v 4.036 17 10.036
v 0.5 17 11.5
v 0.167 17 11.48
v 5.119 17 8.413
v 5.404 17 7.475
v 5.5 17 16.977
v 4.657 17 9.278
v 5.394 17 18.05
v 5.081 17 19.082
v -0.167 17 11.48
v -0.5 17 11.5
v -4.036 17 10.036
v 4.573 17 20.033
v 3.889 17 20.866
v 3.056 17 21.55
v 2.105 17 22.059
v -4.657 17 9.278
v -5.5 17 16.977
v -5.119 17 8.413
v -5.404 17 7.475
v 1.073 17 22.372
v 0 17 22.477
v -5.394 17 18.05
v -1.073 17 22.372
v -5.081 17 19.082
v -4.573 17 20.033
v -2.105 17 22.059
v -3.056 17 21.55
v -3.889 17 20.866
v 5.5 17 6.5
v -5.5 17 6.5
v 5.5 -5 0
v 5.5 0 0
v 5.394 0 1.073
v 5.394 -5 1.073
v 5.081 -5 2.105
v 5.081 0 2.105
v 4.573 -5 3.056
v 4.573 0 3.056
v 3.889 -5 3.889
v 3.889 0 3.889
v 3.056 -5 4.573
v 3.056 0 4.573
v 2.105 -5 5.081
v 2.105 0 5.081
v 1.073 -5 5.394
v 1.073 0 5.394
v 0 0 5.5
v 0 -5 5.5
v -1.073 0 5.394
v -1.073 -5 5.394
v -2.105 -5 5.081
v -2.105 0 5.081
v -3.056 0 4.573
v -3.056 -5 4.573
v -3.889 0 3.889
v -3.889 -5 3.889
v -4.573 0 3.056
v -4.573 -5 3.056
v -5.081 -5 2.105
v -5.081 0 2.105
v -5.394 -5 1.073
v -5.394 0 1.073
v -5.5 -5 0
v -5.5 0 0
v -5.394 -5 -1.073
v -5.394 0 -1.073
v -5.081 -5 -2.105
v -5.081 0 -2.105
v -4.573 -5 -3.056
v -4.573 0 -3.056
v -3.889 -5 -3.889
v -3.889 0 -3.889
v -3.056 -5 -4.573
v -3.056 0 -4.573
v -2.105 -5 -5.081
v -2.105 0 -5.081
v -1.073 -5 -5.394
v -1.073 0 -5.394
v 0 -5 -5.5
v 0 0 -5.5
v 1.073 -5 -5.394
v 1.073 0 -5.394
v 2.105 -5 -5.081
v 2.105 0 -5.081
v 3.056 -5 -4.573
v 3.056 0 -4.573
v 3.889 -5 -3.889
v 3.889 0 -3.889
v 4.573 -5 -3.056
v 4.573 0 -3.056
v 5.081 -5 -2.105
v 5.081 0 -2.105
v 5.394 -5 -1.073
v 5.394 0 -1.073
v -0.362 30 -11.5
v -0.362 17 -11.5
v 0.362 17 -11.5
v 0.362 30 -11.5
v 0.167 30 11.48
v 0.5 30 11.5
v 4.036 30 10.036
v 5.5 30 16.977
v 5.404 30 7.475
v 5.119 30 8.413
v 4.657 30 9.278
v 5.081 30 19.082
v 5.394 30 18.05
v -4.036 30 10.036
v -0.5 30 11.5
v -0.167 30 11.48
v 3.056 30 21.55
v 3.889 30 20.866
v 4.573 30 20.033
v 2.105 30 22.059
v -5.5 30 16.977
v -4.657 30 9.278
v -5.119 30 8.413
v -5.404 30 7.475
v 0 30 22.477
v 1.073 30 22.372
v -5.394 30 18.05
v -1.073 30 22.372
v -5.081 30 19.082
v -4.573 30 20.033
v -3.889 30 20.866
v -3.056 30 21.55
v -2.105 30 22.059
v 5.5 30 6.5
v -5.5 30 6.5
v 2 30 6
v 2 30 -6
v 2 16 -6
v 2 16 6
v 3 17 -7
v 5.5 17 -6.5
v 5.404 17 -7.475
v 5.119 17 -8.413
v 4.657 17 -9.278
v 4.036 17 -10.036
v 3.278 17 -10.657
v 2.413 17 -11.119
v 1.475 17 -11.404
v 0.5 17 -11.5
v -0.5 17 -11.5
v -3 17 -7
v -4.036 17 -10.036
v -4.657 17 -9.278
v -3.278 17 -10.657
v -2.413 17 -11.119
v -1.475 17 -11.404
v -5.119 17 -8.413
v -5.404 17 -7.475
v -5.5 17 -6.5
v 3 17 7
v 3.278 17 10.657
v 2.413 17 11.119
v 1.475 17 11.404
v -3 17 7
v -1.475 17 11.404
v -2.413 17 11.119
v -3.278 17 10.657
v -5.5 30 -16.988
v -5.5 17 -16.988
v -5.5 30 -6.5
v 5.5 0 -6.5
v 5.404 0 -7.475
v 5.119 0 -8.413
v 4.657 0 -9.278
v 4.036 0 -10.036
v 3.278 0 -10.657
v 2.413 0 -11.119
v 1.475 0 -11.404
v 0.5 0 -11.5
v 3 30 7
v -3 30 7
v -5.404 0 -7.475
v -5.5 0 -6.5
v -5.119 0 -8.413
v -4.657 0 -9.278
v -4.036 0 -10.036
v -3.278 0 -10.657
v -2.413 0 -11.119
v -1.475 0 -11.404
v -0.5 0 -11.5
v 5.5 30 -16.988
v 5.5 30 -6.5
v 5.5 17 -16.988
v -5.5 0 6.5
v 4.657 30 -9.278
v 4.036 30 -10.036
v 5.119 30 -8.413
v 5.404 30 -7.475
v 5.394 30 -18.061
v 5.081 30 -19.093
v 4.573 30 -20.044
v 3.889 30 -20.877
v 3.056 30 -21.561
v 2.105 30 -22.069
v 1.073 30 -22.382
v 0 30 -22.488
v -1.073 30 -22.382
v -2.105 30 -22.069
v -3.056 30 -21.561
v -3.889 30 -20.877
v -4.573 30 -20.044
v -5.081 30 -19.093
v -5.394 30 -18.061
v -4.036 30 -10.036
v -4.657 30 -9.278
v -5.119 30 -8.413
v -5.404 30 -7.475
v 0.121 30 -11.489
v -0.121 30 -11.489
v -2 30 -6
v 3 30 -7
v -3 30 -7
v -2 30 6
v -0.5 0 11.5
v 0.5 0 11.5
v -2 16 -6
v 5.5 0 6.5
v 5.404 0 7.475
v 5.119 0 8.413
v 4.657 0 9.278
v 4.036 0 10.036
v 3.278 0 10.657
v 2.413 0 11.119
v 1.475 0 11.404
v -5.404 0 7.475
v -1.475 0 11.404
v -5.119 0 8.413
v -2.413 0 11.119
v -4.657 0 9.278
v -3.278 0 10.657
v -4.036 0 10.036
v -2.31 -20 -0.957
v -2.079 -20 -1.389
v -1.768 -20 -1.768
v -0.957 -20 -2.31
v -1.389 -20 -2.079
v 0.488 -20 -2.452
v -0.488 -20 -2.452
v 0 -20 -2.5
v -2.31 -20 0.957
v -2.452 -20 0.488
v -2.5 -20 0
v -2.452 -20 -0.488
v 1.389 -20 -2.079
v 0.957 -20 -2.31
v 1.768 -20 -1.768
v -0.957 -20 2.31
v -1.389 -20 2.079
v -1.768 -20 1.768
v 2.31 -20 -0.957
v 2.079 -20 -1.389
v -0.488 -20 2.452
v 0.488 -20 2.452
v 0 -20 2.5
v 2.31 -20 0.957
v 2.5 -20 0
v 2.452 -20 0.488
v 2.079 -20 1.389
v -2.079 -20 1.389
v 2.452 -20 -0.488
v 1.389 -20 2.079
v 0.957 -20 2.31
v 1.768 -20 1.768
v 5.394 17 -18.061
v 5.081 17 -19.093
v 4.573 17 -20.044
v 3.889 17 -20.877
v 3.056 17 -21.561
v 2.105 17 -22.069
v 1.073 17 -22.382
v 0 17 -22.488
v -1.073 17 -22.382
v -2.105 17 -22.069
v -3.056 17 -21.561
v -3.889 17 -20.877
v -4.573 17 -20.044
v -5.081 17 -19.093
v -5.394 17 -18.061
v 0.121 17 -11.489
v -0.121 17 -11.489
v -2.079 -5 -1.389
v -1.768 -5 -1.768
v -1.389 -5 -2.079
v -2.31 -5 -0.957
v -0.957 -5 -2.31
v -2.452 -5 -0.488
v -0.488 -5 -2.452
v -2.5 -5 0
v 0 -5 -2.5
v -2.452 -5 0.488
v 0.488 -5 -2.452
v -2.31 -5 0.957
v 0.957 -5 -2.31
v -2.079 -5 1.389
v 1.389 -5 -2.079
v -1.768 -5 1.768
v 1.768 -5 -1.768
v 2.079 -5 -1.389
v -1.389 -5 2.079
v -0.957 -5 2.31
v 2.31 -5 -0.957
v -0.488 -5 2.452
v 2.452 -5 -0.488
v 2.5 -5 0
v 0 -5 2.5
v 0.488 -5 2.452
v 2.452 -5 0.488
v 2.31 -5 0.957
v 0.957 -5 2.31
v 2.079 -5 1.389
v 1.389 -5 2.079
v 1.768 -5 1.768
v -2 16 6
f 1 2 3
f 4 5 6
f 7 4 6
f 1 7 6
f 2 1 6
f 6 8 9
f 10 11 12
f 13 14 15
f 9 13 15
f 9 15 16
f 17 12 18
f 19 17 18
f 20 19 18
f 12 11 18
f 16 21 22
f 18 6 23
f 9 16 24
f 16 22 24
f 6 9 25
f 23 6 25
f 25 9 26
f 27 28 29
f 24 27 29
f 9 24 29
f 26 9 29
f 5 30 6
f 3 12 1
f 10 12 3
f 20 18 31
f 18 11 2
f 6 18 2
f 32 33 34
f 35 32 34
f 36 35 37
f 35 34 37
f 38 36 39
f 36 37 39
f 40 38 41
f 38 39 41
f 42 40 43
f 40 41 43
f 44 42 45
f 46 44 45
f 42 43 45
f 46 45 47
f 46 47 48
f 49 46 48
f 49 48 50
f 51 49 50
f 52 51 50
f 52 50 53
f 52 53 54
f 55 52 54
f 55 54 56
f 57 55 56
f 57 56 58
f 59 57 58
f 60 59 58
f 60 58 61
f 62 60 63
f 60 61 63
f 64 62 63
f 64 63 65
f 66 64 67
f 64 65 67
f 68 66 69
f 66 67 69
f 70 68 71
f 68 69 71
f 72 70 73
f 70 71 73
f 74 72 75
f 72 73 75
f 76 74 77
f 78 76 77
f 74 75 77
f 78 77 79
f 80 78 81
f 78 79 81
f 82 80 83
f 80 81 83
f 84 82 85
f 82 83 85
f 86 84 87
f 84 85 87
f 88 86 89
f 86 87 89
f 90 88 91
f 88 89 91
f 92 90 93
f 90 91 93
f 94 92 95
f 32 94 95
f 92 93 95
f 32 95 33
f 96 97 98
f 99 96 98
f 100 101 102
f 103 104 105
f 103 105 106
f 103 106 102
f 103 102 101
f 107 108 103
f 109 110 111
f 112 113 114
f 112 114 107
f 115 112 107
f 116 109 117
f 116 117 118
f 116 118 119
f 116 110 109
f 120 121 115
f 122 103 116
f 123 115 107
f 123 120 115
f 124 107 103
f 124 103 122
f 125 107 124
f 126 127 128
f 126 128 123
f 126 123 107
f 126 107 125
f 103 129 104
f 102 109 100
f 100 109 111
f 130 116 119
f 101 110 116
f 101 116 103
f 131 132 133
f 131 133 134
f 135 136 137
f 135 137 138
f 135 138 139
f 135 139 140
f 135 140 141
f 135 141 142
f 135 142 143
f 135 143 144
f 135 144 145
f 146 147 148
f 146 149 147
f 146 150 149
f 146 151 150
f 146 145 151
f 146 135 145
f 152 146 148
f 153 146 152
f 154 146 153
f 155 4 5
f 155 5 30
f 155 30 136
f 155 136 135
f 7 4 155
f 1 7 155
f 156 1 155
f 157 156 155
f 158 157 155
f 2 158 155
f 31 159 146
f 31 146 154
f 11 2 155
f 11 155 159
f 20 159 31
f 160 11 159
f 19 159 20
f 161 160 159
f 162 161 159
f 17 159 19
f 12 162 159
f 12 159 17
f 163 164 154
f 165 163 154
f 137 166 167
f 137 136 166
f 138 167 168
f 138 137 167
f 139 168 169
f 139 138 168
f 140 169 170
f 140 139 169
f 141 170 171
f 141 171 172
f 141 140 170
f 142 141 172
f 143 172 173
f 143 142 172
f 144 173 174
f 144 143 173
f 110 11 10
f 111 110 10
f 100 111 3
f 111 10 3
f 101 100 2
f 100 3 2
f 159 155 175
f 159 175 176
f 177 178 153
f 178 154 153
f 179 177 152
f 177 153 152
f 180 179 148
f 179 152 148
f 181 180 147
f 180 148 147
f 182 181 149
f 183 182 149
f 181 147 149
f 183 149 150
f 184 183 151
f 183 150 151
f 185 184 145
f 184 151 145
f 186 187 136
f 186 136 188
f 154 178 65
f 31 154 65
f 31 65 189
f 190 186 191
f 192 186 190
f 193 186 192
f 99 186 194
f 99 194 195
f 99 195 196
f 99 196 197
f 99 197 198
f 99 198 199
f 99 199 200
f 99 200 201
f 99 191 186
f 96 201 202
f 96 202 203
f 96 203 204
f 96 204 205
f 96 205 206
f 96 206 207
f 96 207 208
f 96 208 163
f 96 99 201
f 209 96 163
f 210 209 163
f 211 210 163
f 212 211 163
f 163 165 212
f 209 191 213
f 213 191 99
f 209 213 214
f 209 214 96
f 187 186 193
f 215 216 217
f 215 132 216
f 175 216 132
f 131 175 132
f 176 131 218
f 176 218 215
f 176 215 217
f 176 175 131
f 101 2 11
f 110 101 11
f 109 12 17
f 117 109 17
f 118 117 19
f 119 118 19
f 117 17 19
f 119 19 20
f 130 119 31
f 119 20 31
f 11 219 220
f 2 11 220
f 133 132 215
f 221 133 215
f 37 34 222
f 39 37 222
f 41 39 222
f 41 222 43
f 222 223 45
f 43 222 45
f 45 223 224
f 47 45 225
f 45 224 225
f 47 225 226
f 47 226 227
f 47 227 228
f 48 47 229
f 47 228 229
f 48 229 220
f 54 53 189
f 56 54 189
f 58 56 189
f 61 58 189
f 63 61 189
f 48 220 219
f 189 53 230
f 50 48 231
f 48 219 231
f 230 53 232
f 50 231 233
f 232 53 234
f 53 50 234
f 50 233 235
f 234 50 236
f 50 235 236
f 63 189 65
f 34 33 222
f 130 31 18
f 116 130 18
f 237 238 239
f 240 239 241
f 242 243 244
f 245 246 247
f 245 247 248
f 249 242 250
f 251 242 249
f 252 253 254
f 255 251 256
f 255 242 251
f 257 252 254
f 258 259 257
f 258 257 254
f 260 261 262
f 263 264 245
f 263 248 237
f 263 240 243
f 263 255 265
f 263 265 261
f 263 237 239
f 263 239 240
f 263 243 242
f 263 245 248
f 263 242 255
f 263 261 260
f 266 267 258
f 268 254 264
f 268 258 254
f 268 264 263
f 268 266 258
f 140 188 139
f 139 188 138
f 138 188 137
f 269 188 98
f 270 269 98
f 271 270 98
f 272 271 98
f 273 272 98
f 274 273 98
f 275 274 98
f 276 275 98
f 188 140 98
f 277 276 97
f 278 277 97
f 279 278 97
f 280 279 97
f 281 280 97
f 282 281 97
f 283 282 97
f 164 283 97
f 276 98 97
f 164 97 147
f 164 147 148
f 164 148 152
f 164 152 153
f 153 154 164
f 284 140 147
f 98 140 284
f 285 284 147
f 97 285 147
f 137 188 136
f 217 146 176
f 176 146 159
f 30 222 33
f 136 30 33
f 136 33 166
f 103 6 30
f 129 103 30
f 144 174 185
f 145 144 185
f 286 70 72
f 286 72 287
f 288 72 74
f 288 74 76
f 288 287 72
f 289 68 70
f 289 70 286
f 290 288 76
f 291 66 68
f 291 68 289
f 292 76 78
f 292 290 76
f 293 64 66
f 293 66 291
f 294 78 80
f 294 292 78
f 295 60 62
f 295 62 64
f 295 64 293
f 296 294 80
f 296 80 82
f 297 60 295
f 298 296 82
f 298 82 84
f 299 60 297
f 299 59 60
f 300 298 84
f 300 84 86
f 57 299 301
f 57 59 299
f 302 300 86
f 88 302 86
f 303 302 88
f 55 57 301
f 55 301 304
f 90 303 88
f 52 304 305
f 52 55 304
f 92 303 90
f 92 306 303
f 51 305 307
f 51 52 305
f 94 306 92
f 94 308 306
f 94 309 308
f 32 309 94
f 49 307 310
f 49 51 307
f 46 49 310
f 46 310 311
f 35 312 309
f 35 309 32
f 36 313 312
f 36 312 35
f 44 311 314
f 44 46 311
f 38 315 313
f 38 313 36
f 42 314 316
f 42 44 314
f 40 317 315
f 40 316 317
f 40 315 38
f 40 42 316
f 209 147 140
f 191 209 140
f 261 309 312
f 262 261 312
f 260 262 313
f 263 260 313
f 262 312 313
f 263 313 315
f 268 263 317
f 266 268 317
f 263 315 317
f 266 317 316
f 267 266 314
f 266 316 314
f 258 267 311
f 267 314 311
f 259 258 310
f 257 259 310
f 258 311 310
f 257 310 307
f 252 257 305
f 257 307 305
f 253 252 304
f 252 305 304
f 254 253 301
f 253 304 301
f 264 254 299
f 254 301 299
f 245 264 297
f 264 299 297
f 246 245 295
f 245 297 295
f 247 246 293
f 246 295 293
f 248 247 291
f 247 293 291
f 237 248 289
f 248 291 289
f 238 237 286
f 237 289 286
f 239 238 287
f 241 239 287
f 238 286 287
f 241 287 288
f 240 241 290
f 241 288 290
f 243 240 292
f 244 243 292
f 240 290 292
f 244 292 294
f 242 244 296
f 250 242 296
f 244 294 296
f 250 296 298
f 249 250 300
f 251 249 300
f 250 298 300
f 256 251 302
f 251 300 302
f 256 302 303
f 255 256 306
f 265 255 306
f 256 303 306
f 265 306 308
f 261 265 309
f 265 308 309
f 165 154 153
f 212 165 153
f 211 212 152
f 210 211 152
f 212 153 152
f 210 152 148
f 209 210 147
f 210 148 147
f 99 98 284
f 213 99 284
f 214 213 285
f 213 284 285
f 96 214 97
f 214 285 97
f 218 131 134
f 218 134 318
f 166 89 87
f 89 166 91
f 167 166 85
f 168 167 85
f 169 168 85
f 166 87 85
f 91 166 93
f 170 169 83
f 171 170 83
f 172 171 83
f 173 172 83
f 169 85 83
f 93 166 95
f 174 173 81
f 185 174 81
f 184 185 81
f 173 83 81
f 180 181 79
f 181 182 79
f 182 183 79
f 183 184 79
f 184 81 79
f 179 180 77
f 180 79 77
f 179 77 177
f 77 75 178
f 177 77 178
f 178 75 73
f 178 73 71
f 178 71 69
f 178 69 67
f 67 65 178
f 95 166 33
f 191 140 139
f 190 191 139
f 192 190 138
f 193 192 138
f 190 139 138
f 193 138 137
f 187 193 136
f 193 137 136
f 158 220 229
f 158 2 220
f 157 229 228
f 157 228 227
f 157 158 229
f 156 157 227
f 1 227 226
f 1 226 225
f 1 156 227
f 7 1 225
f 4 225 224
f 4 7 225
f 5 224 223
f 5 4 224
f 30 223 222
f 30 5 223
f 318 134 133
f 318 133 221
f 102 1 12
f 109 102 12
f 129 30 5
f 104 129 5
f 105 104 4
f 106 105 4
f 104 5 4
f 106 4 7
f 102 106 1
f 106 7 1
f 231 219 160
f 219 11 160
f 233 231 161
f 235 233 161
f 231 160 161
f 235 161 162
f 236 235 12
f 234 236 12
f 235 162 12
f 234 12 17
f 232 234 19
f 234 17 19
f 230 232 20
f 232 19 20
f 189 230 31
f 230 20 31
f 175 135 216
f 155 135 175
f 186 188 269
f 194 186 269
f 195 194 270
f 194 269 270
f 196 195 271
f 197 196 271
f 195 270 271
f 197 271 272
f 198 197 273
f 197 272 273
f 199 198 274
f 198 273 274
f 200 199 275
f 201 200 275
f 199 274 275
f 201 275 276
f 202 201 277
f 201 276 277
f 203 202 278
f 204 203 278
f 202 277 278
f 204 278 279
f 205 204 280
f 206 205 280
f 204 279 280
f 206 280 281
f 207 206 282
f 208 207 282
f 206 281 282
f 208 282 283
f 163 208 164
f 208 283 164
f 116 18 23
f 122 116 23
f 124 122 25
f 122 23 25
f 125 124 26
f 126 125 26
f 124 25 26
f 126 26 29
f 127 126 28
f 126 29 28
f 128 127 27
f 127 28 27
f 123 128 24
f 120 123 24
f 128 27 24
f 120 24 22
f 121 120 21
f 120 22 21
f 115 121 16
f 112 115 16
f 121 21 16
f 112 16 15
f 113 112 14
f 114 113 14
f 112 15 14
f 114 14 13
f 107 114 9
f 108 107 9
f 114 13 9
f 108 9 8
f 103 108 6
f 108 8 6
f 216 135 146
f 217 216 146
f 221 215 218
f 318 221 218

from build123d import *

# Parameters (mm, degrees)
F0_R      = 5.5
F1_DEPTH  = 5
F2_R      = 2.5
F3_DEPTH  = 15
F5_DEPTH  = 17
F6_R      = 5
F7_W      = 6
F7_H      = 14
F8_DEPTH  = 13
F9_W      = 4
F9_H      = 12
F10_DEPTH = 14
F12_DEPTH = 13


with BuildPart() as f1:
    # F0 (on Front) → F1 (new body)
    with BuildSketch(Plane.XZ):
        Circle(F0_R)
    extrude(amount=F1_DEPTH)

    # F2 (on face) → F3 (join)
    with BuildSketch(Plane.XZ.offset(5)):
        Circle(F2_R)
    extrude(amount=F3_DEPTH)

    # F4 (on face) → F5 (join)
    with BuildSketch(Plane(origin=(0, 0, 0), x_dir=(-1, 0, 0), z_dir=(0, 1, 0))):
        Polygon((0, 5.5), (0, 0), (5.5, 0), (5.5, 11.5), (0, 11.5), align=None)
        Polygon((0, -5.5), (0, 0), (-5.5, 0), (-5.5, -11.5), (0, -11.5), align=None)
        Polygon((-5.5, 0), (0, 0), (0, 5.5), (0, 11.5), (-5.5, 11.5), align=None)
        Polygon((5.5, 0), (0, 0), (0, -5.5), (0, -11.5), (5.5, -11.5), align=None)
    extrude(amount=F5_DEPTH)

    # F6
    f6_edges = [f1.edges().sort_by_distance(p)[0] for p in [
        (-5.5, 8.5, -11.5),
        (5.5, 8.5, -11.5),
        (5.5, 8.5, 11.5),
        (-5.5, 8.5, 11.5),
    ]]
    fillet(f6_edges, radius=F6_R)

    # F7 (on face) → F8 (join)
    with BuildSketch(Plane(origin=(0, 17, 0), x_dir=(-1, 0, 0), z_dir=(0, 1, 0))):
        Rectangle(F7_W, F7_H)
    extrude(amount=F8_DEPTH)

    # F9 (on face) → F10 (cut)
    with BuildSketch(Plane(origin=(0, 30, 0), x_dir=(-1, 0, 0), z_dir=(0, 1, 0))):
        Rectangle(F9_W, F9_H)
    extrude(amount=-F10_DEPTH, mode=Mode.SUBTRACT)


with BuildPart() as f12:
    # F11 (on face) → F12 (new body)
    with BuildSketch(Plane(origin=(0, 17, 0), x_dir=(-1, 0, 0), z_dir=(0, 1, 0))):
        with BuildLine():
            Line((0, 16.9772255751), (5.5, 16.9772255751))
            ThreePointArc((5.5, 16.9772255751), (0, 22.4772255751), (-5.5, 16.9772255751))
            Line((-5.5, 16.9772255751), (0, 16.9772255751))
        make_face()
        with BuildLine():
            ThreePointArc((0.5, 11.5), (4.0620192023, 13.2691263315), (5.5, 16.9772255751))
            Line((5.5, 16.9772255751), (0, 16.9772255751))
            Line((0, 16.9772255751), (-5.5, 16.9772255751))
            ThreePointArc((-5.5, 16.9772255751), (-4.0620192023, 13.2691263315), (-0.5, 11.5))
            Line((-0.5, 11.5), (0.5, 11.5))
        make_face()
        with BuildLine():
            Line((5.5, 6.5), (5.5, 16.9772255751))
            ThreePointArc((5.5, 16.9772255751), (4.0620192023, 13.2691263315), (0.5, 11.5))
            ThreePointArc((0.5, 11.5), (2.4134171618, 11.1193976626), (4.0355339059, 10.0355339059))
            ThreePointArc((4.0355339059, 10.0355339059), (5.1193976626, 8.4134171618), (5.5, 6.5))
        make_face()
        with BuildLine():
            ThreePointArc((-0.5, 11.5), (-4.0620192023, 13.2691263315), (-5.5, 16.9772255751))
            Line((-5.5, 16.9772255751), (-5.5, 6.5))
            ThreePointArc((-5.5, 6.5), (-5.1193976626, 8.4134171618), (-4.0355339059, 10.0355339059))
            ThreePointArc((-4.0355339059, 10.0355339059), (-2.4134171618, 11.1193976626), (-0.5, 11.5))
        make_face()
        with BuildLine():
            ThreePointArc((4.0355339059, 10.0355339059), (2.4134171618, 11.1193976626), (0.5, 11.5))
            ThreePointArc((0.5, 11.5), (0, 11.4772255751), (-0.5, 11.5))
            ThreePointArc((-0.5, 11.5), (-2.4134171618, 11.1193976626), (-4.0355339059, 10.0355339059))
            Line((-4.0355339059, 10.0355339059), (4.0355339059, 10.0355339059))
        make_face()
    extrude(amount=F12_DEPTH)


with BuildPart() as f12b:
    # F11 (on face) → F12, piece 2 (new body)
    with BuildSketch(Plane(origin=(0, 17, 0), x_dir=(-1, 0, 0), z_dir=(0, 1, 0))):
        with BuildLine():
            Line((5.5, -16.9880884817), (5.5, -6.5))
            ThreePointArc((5.5, -6.5), (5.1193976626, -8.4134171618), (4.0355339059, -10.0355339059))
            ThreePointArc((4.0355339059, -10.0355339059), (2.4134171618, -11.1193976626), (0.5, -11.5))
            Line((0.5, -11.5), (0.3617800672, -11.5))
            ThreePointArc((0.3617800672, -11.5), (4.0149589269, -13.2290853139), (5.5, -16.9880884817))
        make_face()
        with BuildLine():
            ThreePointArc((-4.0355339059, -10.0355339059), (-5.1193976626, -8.4134171618), (-5.5, -6.5))
            Line((-5.5, -6.5), (-5.5, -16.9880884817))
            ThreePointArc((-5.5, -16.9880884817), (-4.0149589269, -13.2290853139), (-0.3617800672, -11.5))
            Line((-0.3617800672, -11.5), (-0.5, -11.5))
            ThreePointArc((-0.5, -11.5), (-2.4134171618, -11.1193976626), (-4.0355339059, -10.0355339059))
        make_face()
        with BuildLine():
            Line((0, -16.9880884817), (5.5, -16.9880884817))
            ThreePointArc((5.5, -16.9880884817), (4.0149589269, -13.2290853139), (0.3617800672, -11.5))
            Line((0.3617800672, -11.5), (-0.3617800672, -11.5))
            ThreePointArc((-0.3617800672, -11.5), (-4.0149589269, -13.2290853139), (-5.5, -16.9880884817))
            Line((-5.5, -16.9880884817), (0, -16.9880884817))
        make_face()
        with BuildLine():
            ThreePointArc((-5.5, -16.9880884817), (0, -22.4880884817), (5.5, -16.9880884817))
            Line((5.5, -16.9880884817), (0, -16.9880884817))
            Line((0, -16.9880884817), (-5.5, -16.9880884817))
        make_face()
        with BuildLine():
            ThreePointArc((0.5, -11.5), (2.4134171618, -11.1193976626), (4.0355339059, -10.0355339059))
            Line((4.0355339059, -10.0355339059), (-4.0355339059, -10.0355339059))
            ThreePointArc((-4.0355339059, -10.0355339059), (-2.4134171618, -11.1193976626), (-0.5, -11.5))
            Line((-0.5, -11.5), (-0.3617800672, -11.5))
            ThreePointArc((-0.3617800672, -11.5), (0, -11.4880884817), (0.3617800672, -11.5))
            Line((0.3617800672, -11.5), (0.5, -11.5))
        make_face()
    extrude(amount=F12_DEPTH)


solid = Compound([f1.part, f12.part, f12b.part])
